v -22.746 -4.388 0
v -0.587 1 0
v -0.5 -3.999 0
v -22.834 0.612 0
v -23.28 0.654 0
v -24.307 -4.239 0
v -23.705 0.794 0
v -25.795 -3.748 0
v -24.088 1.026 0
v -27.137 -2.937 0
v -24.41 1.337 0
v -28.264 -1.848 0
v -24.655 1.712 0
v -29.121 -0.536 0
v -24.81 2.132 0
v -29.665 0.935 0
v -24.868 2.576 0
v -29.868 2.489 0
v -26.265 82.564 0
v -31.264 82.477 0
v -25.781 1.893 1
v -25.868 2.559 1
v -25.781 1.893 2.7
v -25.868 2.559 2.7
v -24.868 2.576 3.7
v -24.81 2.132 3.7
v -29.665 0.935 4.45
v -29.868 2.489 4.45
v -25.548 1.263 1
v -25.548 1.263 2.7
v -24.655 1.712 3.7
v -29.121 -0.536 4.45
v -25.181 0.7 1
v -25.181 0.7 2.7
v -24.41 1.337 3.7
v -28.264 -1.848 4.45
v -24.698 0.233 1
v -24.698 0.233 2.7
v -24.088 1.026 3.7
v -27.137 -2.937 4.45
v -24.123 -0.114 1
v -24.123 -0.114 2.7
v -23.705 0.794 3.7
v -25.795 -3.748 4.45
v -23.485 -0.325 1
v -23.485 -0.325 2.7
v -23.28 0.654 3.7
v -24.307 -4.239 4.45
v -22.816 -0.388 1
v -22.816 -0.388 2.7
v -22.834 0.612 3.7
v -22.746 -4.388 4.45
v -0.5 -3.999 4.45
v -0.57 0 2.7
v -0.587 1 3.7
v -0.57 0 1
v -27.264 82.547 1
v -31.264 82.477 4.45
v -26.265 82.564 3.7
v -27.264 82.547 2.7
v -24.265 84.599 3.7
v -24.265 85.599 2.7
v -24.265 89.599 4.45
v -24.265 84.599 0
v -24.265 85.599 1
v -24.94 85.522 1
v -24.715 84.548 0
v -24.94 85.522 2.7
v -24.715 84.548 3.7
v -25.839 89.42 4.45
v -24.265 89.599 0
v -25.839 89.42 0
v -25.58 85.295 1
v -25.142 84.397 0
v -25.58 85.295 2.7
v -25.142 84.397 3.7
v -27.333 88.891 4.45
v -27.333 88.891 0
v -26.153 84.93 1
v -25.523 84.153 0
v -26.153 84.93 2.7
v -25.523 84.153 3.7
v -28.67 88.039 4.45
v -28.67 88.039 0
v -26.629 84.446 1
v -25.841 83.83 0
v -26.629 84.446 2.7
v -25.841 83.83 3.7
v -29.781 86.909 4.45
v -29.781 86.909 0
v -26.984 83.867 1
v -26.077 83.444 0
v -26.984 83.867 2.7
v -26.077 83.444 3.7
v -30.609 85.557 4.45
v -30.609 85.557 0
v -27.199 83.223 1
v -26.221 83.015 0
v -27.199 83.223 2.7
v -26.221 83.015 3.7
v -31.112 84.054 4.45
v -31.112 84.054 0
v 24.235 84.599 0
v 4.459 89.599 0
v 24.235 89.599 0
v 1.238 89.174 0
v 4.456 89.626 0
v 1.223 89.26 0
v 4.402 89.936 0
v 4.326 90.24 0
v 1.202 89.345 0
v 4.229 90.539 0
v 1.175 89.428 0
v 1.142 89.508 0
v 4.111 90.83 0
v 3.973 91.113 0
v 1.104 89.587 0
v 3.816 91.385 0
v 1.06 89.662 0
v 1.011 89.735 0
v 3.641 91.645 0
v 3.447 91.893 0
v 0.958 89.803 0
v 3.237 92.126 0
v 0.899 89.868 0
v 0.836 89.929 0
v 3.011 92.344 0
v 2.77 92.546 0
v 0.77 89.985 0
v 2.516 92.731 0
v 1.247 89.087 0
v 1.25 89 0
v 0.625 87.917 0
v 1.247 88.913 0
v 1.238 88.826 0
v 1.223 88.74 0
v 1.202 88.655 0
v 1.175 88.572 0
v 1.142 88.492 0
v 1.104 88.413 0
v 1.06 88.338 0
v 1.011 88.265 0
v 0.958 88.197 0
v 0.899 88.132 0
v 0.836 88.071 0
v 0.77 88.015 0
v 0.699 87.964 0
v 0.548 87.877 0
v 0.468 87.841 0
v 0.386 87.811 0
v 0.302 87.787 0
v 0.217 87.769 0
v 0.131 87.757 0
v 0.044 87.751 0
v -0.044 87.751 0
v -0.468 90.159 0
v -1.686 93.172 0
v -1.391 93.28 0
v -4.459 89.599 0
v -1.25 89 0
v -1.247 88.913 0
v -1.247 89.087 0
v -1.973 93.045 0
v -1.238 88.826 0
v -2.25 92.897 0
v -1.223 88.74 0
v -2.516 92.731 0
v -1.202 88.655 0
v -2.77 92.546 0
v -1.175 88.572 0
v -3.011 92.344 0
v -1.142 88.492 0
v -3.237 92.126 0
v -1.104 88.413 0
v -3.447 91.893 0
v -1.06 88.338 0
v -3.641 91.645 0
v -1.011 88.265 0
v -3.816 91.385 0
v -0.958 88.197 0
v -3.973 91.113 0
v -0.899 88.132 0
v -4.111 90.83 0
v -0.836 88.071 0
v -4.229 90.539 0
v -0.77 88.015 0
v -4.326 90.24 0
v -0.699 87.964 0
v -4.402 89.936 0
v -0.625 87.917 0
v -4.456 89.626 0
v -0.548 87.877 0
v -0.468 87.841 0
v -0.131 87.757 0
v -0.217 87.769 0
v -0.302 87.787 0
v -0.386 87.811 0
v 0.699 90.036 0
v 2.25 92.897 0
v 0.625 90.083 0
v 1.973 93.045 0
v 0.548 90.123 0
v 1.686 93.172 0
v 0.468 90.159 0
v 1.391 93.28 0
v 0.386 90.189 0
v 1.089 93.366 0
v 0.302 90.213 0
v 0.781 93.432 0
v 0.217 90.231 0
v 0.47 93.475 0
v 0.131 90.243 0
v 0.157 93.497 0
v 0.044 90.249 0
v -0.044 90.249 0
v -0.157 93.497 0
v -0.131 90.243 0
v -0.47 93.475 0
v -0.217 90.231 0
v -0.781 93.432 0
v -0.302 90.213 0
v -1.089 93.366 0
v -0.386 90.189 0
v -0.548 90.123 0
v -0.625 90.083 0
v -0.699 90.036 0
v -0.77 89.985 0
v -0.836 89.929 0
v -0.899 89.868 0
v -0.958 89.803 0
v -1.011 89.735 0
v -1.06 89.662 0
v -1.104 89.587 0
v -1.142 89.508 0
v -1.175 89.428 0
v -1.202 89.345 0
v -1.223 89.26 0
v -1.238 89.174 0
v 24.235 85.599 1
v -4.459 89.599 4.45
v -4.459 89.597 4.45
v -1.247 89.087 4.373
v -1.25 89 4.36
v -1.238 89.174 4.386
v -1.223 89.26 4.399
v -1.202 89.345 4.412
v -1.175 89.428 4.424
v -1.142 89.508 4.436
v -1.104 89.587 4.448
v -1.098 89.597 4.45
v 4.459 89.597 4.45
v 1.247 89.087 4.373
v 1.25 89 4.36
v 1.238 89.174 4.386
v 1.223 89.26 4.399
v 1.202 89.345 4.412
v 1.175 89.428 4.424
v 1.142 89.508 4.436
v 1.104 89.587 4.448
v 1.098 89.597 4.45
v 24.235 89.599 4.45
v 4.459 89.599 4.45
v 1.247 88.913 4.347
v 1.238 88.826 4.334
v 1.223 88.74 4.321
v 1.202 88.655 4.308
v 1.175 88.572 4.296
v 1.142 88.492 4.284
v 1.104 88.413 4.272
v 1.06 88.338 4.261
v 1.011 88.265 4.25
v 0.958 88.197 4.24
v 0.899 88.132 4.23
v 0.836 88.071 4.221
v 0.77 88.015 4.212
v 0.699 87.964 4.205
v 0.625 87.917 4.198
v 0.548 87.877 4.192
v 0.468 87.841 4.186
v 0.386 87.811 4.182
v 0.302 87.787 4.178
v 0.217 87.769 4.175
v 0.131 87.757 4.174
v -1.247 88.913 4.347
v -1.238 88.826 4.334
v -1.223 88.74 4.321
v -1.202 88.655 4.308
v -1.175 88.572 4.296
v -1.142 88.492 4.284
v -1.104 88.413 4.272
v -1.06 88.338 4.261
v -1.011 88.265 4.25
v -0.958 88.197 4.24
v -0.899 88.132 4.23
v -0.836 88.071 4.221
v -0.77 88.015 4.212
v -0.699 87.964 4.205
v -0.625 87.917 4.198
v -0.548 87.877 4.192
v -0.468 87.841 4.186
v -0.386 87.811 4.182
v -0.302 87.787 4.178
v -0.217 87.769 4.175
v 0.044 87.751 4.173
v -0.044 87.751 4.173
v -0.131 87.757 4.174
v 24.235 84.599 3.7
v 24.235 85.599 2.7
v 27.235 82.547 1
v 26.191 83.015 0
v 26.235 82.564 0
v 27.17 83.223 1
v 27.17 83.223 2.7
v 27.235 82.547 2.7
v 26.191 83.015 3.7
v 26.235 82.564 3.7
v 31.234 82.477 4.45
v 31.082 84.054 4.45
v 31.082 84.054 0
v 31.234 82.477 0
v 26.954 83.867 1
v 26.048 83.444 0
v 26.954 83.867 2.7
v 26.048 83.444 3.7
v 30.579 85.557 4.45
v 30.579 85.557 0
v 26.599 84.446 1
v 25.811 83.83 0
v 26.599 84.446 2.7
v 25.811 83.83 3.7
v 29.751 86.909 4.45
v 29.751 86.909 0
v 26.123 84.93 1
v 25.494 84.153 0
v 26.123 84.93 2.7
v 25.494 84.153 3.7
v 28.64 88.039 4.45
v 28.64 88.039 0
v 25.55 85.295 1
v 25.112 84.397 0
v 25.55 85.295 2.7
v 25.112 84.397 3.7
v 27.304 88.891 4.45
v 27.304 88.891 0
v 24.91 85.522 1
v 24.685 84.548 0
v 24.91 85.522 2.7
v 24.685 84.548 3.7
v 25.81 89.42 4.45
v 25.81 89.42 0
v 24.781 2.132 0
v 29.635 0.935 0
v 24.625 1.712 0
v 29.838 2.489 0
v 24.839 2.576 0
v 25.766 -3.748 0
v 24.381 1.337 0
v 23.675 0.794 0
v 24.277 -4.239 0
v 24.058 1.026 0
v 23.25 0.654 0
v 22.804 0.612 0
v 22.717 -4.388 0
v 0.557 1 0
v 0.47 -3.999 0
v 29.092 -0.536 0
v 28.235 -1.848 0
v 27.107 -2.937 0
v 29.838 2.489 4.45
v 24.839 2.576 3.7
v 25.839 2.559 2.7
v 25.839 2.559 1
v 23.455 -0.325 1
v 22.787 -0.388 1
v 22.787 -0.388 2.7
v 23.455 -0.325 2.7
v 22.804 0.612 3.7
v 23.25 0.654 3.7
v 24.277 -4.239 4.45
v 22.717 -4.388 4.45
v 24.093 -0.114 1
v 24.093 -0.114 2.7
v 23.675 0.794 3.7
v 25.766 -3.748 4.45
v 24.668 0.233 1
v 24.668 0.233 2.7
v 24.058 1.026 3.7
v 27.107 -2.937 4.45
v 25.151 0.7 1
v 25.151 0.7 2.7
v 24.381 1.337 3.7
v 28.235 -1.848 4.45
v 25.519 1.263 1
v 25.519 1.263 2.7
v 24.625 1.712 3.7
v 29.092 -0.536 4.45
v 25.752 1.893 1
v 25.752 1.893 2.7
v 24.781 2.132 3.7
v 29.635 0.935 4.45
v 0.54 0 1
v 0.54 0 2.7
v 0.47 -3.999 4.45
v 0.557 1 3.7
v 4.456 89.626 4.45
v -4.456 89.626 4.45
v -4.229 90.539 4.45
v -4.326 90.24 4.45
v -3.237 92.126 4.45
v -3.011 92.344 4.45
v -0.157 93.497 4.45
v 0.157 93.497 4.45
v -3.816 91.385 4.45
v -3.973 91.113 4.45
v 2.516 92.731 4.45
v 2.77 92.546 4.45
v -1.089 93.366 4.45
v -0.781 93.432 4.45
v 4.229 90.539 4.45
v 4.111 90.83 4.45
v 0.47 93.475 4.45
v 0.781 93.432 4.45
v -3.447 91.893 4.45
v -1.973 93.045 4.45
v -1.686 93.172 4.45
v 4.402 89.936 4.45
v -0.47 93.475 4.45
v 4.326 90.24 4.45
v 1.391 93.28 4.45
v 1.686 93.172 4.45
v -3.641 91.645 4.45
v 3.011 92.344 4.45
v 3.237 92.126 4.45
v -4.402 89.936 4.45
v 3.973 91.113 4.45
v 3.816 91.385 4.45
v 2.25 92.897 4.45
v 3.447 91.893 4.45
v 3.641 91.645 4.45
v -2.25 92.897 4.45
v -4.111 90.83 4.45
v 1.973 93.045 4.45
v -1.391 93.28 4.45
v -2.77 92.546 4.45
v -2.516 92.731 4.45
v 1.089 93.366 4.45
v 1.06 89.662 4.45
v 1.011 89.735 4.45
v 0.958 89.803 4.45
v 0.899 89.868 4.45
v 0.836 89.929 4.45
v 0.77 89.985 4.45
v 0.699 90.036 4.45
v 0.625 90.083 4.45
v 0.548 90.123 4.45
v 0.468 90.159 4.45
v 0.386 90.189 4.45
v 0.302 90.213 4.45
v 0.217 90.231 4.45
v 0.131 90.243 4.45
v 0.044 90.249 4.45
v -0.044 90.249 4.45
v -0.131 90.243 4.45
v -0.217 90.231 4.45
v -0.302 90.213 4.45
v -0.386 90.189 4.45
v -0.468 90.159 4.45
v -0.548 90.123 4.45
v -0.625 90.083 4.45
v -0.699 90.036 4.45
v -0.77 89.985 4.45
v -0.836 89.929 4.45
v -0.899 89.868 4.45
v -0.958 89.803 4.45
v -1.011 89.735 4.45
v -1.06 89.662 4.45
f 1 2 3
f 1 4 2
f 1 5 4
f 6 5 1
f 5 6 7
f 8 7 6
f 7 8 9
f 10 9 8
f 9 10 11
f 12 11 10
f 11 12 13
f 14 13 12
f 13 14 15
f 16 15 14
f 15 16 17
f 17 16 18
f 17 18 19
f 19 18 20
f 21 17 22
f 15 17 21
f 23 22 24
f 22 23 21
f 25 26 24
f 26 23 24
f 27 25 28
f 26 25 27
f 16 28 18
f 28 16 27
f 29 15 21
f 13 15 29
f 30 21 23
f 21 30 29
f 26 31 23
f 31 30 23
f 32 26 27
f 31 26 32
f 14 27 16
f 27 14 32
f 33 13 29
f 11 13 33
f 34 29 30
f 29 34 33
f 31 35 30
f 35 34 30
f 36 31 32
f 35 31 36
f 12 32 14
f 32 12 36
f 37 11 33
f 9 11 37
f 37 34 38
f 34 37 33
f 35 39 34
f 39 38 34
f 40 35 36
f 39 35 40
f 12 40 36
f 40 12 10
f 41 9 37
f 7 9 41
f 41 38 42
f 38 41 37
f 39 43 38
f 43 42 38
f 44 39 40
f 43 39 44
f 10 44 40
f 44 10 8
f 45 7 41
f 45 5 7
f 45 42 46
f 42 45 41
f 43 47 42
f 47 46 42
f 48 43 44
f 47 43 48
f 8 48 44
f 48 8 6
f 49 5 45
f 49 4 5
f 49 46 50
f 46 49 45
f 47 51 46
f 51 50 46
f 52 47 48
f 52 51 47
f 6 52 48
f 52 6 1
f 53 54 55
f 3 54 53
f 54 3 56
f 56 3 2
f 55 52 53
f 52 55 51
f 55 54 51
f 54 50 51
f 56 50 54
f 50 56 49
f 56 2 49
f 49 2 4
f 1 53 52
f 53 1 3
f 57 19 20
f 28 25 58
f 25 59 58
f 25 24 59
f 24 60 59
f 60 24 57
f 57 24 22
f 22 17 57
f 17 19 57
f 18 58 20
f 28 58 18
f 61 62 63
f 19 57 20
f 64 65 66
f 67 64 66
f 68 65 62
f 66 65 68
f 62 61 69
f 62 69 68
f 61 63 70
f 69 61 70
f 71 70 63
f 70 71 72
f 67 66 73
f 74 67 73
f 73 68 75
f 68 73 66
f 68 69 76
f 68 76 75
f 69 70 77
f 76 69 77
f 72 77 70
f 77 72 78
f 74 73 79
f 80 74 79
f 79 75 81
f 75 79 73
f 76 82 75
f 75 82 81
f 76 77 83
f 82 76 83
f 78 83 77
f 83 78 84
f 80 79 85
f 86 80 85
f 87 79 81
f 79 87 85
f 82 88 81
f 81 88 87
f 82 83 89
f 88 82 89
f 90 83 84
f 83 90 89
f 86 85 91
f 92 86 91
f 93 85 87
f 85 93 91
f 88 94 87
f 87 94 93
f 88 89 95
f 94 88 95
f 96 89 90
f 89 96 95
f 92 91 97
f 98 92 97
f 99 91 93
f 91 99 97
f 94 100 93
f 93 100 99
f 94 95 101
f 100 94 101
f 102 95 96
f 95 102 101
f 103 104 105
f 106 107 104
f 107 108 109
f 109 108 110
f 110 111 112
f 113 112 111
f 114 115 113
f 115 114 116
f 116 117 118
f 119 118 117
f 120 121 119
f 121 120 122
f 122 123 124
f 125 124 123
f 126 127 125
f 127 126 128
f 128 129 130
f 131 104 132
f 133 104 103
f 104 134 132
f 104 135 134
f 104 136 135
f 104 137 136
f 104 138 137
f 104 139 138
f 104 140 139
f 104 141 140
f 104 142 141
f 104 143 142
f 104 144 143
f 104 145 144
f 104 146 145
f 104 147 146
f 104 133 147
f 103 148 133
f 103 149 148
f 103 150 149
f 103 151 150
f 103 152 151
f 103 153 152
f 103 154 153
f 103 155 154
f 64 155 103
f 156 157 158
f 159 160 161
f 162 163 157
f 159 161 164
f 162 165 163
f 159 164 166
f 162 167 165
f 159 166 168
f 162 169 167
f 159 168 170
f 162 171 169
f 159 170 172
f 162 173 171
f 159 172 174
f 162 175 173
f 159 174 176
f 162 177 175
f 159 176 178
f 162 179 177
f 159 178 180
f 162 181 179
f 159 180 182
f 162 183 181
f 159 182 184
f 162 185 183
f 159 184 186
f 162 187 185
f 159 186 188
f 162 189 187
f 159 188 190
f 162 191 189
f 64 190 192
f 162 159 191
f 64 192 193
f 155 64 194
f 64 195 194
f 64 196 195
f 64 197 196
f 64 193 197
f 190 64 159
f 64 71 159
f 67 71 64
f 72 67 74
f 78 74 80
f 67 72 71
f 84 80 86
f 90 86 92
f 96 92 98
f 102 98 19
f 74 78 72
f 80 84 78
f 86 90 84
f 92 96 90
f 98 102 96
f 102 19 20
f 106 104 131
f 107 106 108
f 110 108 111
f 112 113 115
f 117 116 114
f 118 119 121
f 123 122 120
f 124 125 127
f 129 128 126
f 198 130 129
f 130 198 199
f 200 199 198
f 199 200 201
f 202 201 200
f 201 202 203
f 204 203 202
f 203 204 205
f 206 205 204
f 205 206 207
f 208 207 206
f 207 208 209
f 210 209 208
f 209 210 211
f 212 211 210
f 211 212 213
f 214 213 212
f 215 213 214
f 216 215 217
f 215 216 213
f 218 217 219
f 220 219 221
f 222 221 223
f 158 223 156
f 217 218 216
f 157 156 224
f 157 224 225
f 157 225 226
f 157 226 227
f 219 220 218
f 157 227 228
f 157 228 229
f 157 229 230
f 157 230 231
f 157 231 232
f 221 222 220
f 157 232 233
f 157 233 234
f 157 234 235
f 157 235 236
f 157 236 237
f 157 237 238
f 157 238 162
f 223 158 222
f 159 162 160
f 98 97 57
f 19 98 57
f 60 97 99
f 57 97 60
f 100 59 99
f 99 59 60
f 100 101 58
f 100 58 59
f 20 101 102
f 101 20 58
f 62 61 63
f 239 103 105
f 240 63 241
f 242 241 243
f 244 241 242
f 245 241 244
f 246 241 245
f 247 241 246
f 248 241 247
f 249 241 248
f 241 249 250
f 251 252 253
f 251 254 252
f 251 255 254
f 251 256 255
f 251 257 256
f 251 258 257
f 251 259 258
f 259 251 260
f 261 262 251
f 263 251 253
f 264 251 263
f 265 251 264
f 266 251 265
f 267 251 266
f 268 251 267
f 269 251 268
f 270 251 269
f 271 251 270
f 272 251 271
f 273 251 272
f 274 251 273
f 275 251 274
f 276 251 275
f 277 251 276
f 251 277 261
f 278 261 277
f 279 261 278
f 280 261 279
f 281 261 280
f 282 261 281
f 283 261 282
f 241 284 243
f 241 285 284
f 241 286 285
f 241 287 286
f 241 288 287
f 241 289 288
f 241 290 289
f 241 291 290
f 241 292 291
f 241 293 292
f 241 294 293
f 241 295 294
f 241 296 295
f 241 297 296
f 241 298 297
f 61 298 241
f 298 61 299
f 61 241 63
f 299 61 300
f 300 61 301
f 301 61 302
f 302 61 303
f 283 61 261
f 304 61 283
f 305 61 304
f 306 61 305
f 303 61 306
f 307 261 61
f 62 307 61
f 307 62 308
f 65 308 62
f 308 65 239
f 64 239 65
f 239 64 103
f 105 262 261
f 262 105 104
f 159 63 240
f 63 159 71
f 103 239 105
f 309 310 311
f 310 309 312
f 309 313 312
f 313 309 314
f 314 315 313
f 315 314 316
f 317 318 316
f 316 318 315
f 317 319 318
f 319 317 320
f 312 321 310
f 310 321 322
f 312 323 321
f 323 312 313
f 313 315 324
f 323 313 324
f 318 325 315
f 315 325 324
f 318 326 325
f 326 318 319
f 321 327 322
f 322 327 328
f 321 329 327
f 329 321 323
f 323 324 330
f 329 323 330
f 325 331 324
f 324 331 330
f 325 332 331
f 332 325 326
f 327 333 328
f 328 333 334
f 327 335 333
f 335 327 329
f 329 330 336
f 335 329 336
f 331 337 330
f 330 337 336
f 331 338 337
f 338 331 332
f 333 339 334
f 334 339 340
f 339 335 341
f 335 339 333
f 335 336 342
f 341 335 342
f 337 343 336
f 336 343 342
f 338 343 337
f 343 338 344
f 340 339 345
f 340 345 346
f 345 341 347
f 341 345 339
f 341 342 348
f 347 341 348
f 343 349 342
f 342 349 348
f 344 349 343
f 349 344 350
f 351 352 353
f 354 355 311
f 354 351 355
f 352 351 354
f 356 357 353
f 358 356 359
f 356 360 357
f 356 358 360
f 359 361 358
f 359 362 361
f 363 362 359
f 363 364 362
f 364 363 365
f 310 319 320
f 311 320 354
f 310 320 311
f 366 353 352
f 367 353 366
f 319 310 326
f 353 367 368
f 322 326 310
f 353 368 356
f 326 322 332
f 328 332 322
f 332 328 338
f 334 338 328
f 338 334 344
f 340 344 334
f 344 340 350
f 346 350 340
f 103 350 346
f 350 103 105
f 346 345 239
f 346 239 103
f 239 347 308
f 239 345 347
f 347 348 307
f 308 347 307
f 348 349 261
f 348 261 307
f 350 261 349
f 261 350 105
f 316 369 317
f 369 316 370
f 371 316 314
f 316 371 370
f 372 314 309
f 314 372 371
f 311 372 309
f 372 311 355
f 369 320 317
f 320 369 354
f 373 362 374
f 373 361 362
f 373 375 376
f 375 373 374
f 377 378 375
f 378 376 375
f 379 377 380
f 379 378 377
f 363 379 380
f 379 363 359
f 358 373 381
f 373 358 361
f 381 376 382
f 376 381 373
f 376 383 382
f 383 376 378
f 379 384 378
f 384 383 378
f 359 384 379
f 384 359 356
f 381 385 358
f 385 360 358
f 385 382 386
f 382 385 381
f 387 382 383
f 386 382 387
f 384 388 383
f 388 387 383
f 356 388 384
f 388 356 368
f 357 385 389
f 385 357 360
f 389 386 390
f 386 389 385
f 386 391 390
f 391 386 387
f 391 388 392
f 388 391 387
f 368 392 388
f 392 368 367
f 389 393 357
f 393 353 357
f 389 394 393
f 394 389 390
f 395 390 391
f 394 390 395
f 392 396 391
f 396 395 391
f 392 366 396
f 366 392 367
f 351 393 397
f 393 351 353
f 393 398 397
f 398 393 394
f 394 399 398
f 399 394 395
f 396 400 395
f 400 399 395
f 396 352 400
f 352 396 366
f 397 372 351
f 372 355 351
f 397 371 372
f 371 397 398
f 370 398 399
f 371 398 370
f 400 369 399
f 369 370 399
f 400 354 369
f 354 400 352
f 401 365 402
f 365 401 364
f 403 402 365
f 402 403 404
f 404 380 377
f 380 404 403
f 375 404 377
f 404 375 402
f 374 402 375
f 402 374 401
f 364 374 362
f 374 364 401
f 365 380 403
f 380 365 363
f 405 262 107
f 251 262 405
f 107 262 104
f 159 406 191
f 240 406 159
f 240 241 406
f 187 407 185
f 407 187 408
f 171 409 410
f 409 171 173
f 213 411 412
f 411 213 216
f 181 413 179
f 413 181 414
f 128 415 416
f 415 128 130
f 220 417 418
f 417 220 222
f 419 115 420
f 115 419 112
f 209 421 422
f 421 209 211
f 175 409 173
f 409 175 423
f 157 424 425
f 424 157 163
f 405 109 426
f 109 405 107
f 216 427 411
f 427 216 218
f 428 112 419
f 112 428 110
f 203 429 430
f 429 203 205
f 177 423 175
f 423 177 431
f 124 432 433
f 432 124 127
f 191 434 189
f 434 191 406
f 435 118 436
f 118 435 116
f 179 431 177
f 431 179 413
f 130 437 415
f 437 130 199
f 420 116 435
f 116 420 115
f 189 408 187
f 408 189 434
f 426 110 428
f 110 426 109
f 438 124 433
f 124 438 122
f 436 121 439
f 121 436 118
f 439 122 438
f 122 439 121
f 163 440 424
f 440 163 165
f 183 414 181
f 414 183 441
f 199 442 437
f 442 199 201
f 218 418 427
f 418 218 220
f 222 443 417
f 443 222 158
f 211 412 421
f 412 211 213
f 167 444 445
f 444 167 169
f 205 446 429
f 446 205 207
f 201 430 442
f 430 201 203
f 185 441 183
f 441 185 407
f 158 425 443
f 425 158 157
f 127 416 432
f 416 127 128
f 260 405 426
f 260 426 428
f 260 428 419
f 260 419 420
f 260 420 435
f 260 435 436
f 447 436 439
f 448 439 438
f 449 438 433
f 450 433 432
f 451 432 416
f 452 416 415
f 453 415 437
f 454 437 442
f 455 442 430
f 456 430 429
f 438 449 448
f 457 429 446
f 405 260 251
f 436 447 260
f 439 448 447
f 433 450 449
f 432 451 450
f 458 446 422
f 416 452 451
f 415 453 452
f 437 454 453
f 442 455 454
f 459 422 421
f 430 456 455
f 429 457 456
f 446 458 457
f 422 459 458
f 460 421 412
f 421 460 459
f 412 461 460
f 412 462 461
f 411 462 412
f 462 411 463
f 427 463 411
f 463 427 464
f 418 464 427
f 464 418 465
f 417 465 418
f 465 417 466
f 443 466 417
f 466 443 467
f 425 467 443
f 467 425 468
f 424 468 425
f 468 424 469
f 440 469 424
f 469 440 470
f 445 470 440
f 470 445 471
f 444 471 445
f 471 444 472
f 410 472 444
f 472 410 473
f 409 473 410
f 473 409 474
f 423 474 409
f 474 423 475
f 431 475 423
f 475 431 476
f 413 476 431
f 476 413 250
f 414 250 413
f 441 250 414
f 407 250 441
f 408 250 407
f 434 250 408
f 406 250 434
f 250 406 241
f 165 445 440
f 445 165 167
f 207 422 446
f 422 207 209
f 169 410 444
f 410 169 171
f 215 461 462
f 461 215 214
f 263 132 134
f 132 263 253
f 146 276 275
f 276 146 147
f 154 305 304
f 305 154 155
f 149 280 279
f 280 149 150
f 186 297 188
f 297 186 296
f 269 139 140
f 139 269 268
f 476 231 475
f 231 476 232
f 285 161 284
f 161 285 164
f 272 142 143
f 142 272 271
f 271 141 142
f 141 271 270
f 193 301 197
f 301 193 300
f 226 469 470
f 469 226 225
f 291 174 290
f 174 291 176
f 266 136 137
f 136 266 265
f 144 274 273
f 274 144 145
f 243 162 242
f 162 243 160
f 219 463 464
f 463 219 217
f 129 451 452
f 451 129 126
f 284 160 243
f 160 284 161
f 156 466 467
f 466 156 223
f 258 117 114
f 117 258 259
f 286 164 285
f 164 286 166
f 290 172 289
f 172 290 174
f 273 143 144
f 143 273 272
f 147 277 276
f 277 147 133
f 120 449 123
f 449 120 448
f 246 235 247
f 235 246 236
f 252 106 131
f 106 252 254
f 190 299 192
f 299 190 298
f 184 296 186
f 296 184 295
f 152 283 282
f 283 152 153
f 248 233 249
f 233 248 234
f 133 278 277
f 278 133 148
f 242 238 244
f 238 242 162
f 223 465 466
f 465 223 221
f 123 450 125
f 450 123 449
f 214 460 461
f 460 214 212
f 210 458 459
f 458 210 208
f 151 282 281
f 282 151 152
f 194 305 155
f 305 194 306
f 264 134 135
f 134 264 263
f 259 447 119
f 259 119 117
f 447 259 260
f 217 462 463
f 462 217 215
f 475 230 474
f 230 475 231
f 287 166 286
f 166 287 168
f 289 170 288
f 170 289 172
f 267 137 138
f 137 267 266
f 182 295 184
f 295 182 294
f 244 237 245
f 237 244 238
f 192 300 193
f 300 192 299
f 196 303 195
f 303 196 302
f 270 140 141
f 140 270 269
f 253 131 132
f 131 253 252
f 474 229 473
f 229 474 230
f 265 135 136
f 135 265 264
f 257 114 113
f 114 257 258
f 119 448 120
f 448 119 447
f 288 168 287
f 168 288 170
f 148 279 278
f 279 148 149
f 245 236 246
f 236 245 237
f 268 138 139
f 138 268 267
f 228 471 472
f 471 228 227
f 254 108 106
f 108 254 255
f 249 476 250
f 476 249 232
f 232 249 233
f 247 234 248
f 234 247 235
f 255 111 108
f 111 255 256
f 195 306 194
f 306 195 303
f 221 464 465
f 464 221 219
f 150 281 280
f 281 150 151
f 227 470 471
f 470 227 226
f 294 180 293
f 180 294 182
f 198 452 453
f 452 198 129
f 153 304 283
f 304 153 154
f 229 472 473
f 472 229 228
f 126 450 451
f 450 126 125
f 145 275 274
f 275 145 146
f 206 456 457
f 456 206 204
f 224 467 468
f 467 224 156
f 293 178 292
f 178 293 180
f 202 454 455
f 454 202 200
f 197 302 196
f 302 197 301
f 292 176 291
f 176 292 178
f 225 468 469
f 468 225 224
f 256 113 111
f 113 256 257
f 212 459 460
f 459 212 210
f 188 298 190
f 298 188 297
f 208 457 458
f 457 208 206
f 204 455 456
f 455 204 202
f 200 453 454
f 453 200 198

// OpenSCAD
// file: lib/polyline.scad
/*
Create a 2d curved polygon strip.

The strip starts centered at [0,0], pointing to the positive x-axis.

w: Width of the polygon strip.
segs: Array of strip segment descriptors, either:
  [l]: A straight segment of length l.
  [a, r]: A curved segment ending in relative angle a, with radius r.
          Angles must be in the range (-360, 360), and are right-hand directed.
*/
module polyline(w, segs) {
  curveSegs = 100;
  polyline_rec(w, segs, 0, 0, 0, 0, [[0,w]],[[0,-w]]);
  module polyline_rec(w, segs, i, x, y, a, prefix, suffix) {
    if (i == len(segs)) {
      //accumulation done, render output
      points = concat(prefix, suffix);
      polygon(points);
    } else {
      seg = segs[i];
      if (len(seg) == 1) {
        polyline_straight_rec(w, segs, i, x, y, a, prefix, suffix);
      } else {
        polyline_curve_rec(w, segs, i, x, y, a, prefix, suffix, curveSegs);
      }
    }
  }
  module polyline_straight_rec(w, segs, i, x, y, a, prefix, suffix) {
    seg = segs[i];
    xn = x + seg[0]*cos(a);
    yn = y + seg[0]*sin(a);
    xoff = w*cos(a+90);
    yoff = w*sin(a+90);
    prefixn = concat(prefix, [[xn+xoff,yn+yoff]]);
    suffixn = concat([[xn-xoff,yn-yoff]], suffix);
    polyline_rec(w, segs, i+1, xn, yn, a, prefixn, suffixn);
  }
  module polyline_curve_rec(w, segs, i, x, y, a, prefix, suffix, curveRemaining) {
      seg = segs[i];
      angle = seg[0]/(curveSegs+1);
      len = 2*seg[1]*abs(sin(seg[0]/(2*curveSegs)));
      an = a + angle;
      xn = x + len * cos(an);
      yn = y + len * sin(an);
      if (curveRemaining == 1) {
          tangent = an+angle; // use angle of next segment, not average
          xoff = w*cos(tangent+90);
          yoff = w*sin(tangent+90);
          prefixn = concat(prefix, [[xn+xoff,yn+yoff]]);
          suffixn = concat([[xn-xoff,yn-yoff]], suffix); 
          polyline_rec(w, segs, i+1, xn, yn, an+angle, prefixn, suffixn);
      } else {
          tangent = an + angle/2;
          xoff = w*cos(tangent+90);
          yoff = w*sin(tangent+90);
          prefixn = concat(prefix, [[xn+xoff,yn+yoff]]);
          suffixn = concat([[xn-xoff,yn-yoff]], suffix); 
          polyline_curve_rec(w, segs, i, xn, yn, an, prefixn, suffixn, curveRemaining-1);
      }
  }
}

module extline(segs) {
  if ($children == 1) {
    extline_rec(segs, 0, [0,0,0], 0) {
      children();
    }
  } else {
    echo("extline requires exactly 1 child");
  }
  module extline_rec(segs, i, pos, a) {
    if (i < len(segs)) {
      if (len(segs[i]) == 1) {
        extline_straight_rec(segs, i, pos, a) {
          children(0);
        }
      } else {
        extline_curve_rec(segs, i, pos, a) {
          children(0);
        }
      }
    }
  }
  module extline_straight_rec(segs, i, pos, a) {
    d = segs[i][0];
    translate(pos) {
      rotate(a, [0,0,1]) {
        rotate(-90, [0,0,1]) {
          rotate(90, [1,0,0]) {
            translate([0,0,-d]) {
              linear_extrude(d) {
                children(0);
              }
            }
          }
        }
      }
    }
    offset = [d*cos(a),d*sin(a),0];
    extline_rec(segs, i+1, pos+offset, a) {
      children(0);
    }
  }
  module extline_curve_rec(segs, i, pos, a) {
    ang = segs[i][0];
    rad = segs[i][1];
    translate(pos) {
      rotate(a-90, [0,0,1]) {
        translate([-rad,0,0]) {
          rotate_extrude(angle=ang, $fn=30) {
            translate([rad,0]) {
              children(0);
            }
          }
        }
      }
    }
    // Magical math. Re-derive if you're curious.
    D = 2*rad*sin(ang/2);
    inlineX = [cos(a), sin(a), 0];
    inlineY = [-sin(a), cos(a), 0];
    offset = D*cos(ang/2)*inlineX + D*sin(ang/2)*inlineY;
    extline_rec(segs, i+1, pos+offset, a+ang) {
      children(0);
    }
  }
}

// Precomputes the [point, angle] pairs used by extline.
// Useful if you need to know where points on your extrusion are located.
function extline_precompute(segs) = extline_pc_rec(segs, 0, [0,0,0], 0, []);

// Accumulates `result` and dispatches the next recursive call.
function extline_pc_rec(segs, i, pos, a, result) =
  let(new_result = concat(result, [[pos,a]]))
  i == len(segs) ? new_result : (len(segs[i]) == 1 ? extline_straight_pc_rec(segs, i, pos, a, new_result) : extline_curve_pc_rec(segs, i, pos, a, new_result));

function extline_straight_pc_rec(segs, i, pos, a, result) = 
  let(d = segs[i][0])
  let(offset = [d*cos(a), d*sin(a), 0])
  extline_pc_rec(segs, i+1, pos+offset, a, result);

function extline_curve_pc_rec(segs, i, pos, a, result) = 
  let(ang = segs[i][0])
  let(rad = segs[i][1])
  // Magical math. Re-derive if you're curious.
  let(D = 2*rad*sin(ang/2))
  let(inlineX = [cos(a), sin(a), 0])
  let(inlineY = [-sin(a), cos(a), 0])
  let(offset = D*cos(ang/2)*inlineX + D*sin(ang/2)*inlineY)
  extline_pc_rec(segs, i+1, pos+offset, a+ang, result);
// main file
use <lib/polyline.scad>

/*
// Placeholder for the badge itself.
translate([-27,0]) {
  square([54,86]);
}
*/

badge_width = 54.5;
badge_height = 86;
badge_thick = 1.7;
badge_radius = 3;

bottom_gap = 10;
lip_deep = 1; //amount lip overlaps badge.
lip_thick = 1; //how thick the lip material is. Should be > lip_deep.
border_depth = 5; //overall border in front of badge.

leg_width = (badge_width - bottom_gap) / 2;

module border() {
  br = badge_radius;
  bw = badge_width - 2*br;
  bh = badge_height- 2*br;
  lw = leg_width;
  translate([0.54,0,0]) {
    rotate(-1,[0,0,1]) {
      extline([[lw],[90,br],[bh],[91,br],[bw],[91,br],[bh],[90,br],[lw]]) {
        translate([-lip_deep,0]) {
          polygon([
            [0, 0],
            [lip_deep, lip_thick],
            [lip_deep, lip_thick+badge_thick],
            [0, 2*lip_thick+badge_thick],
            [border_depth, 2.75*lip_thick+badge_thick],
            [border_depth, 0]
          ]);
        }
      }
    }
  }
}

module holder() {
  difference() {
    union() {
      border();
      translate([0, badge_height+3, 0]) {
        linear_extrude(badge_thick + 2.75*lip_thick) {
          intersection() {
            circle(4.5, $fn=90);
            translate([0,5.097]) {
              square(9, true);
            }
          }
        }
      }
    }
    #translate([0, badge_height+3, -0.1]) {
      linear_extrude(badge_thick + 2.75*lip_thick + 0.2) {
        circle(1.25, $fn=90);
      }
    }
  }
}

render(convexity=4) {
  holder();
}
